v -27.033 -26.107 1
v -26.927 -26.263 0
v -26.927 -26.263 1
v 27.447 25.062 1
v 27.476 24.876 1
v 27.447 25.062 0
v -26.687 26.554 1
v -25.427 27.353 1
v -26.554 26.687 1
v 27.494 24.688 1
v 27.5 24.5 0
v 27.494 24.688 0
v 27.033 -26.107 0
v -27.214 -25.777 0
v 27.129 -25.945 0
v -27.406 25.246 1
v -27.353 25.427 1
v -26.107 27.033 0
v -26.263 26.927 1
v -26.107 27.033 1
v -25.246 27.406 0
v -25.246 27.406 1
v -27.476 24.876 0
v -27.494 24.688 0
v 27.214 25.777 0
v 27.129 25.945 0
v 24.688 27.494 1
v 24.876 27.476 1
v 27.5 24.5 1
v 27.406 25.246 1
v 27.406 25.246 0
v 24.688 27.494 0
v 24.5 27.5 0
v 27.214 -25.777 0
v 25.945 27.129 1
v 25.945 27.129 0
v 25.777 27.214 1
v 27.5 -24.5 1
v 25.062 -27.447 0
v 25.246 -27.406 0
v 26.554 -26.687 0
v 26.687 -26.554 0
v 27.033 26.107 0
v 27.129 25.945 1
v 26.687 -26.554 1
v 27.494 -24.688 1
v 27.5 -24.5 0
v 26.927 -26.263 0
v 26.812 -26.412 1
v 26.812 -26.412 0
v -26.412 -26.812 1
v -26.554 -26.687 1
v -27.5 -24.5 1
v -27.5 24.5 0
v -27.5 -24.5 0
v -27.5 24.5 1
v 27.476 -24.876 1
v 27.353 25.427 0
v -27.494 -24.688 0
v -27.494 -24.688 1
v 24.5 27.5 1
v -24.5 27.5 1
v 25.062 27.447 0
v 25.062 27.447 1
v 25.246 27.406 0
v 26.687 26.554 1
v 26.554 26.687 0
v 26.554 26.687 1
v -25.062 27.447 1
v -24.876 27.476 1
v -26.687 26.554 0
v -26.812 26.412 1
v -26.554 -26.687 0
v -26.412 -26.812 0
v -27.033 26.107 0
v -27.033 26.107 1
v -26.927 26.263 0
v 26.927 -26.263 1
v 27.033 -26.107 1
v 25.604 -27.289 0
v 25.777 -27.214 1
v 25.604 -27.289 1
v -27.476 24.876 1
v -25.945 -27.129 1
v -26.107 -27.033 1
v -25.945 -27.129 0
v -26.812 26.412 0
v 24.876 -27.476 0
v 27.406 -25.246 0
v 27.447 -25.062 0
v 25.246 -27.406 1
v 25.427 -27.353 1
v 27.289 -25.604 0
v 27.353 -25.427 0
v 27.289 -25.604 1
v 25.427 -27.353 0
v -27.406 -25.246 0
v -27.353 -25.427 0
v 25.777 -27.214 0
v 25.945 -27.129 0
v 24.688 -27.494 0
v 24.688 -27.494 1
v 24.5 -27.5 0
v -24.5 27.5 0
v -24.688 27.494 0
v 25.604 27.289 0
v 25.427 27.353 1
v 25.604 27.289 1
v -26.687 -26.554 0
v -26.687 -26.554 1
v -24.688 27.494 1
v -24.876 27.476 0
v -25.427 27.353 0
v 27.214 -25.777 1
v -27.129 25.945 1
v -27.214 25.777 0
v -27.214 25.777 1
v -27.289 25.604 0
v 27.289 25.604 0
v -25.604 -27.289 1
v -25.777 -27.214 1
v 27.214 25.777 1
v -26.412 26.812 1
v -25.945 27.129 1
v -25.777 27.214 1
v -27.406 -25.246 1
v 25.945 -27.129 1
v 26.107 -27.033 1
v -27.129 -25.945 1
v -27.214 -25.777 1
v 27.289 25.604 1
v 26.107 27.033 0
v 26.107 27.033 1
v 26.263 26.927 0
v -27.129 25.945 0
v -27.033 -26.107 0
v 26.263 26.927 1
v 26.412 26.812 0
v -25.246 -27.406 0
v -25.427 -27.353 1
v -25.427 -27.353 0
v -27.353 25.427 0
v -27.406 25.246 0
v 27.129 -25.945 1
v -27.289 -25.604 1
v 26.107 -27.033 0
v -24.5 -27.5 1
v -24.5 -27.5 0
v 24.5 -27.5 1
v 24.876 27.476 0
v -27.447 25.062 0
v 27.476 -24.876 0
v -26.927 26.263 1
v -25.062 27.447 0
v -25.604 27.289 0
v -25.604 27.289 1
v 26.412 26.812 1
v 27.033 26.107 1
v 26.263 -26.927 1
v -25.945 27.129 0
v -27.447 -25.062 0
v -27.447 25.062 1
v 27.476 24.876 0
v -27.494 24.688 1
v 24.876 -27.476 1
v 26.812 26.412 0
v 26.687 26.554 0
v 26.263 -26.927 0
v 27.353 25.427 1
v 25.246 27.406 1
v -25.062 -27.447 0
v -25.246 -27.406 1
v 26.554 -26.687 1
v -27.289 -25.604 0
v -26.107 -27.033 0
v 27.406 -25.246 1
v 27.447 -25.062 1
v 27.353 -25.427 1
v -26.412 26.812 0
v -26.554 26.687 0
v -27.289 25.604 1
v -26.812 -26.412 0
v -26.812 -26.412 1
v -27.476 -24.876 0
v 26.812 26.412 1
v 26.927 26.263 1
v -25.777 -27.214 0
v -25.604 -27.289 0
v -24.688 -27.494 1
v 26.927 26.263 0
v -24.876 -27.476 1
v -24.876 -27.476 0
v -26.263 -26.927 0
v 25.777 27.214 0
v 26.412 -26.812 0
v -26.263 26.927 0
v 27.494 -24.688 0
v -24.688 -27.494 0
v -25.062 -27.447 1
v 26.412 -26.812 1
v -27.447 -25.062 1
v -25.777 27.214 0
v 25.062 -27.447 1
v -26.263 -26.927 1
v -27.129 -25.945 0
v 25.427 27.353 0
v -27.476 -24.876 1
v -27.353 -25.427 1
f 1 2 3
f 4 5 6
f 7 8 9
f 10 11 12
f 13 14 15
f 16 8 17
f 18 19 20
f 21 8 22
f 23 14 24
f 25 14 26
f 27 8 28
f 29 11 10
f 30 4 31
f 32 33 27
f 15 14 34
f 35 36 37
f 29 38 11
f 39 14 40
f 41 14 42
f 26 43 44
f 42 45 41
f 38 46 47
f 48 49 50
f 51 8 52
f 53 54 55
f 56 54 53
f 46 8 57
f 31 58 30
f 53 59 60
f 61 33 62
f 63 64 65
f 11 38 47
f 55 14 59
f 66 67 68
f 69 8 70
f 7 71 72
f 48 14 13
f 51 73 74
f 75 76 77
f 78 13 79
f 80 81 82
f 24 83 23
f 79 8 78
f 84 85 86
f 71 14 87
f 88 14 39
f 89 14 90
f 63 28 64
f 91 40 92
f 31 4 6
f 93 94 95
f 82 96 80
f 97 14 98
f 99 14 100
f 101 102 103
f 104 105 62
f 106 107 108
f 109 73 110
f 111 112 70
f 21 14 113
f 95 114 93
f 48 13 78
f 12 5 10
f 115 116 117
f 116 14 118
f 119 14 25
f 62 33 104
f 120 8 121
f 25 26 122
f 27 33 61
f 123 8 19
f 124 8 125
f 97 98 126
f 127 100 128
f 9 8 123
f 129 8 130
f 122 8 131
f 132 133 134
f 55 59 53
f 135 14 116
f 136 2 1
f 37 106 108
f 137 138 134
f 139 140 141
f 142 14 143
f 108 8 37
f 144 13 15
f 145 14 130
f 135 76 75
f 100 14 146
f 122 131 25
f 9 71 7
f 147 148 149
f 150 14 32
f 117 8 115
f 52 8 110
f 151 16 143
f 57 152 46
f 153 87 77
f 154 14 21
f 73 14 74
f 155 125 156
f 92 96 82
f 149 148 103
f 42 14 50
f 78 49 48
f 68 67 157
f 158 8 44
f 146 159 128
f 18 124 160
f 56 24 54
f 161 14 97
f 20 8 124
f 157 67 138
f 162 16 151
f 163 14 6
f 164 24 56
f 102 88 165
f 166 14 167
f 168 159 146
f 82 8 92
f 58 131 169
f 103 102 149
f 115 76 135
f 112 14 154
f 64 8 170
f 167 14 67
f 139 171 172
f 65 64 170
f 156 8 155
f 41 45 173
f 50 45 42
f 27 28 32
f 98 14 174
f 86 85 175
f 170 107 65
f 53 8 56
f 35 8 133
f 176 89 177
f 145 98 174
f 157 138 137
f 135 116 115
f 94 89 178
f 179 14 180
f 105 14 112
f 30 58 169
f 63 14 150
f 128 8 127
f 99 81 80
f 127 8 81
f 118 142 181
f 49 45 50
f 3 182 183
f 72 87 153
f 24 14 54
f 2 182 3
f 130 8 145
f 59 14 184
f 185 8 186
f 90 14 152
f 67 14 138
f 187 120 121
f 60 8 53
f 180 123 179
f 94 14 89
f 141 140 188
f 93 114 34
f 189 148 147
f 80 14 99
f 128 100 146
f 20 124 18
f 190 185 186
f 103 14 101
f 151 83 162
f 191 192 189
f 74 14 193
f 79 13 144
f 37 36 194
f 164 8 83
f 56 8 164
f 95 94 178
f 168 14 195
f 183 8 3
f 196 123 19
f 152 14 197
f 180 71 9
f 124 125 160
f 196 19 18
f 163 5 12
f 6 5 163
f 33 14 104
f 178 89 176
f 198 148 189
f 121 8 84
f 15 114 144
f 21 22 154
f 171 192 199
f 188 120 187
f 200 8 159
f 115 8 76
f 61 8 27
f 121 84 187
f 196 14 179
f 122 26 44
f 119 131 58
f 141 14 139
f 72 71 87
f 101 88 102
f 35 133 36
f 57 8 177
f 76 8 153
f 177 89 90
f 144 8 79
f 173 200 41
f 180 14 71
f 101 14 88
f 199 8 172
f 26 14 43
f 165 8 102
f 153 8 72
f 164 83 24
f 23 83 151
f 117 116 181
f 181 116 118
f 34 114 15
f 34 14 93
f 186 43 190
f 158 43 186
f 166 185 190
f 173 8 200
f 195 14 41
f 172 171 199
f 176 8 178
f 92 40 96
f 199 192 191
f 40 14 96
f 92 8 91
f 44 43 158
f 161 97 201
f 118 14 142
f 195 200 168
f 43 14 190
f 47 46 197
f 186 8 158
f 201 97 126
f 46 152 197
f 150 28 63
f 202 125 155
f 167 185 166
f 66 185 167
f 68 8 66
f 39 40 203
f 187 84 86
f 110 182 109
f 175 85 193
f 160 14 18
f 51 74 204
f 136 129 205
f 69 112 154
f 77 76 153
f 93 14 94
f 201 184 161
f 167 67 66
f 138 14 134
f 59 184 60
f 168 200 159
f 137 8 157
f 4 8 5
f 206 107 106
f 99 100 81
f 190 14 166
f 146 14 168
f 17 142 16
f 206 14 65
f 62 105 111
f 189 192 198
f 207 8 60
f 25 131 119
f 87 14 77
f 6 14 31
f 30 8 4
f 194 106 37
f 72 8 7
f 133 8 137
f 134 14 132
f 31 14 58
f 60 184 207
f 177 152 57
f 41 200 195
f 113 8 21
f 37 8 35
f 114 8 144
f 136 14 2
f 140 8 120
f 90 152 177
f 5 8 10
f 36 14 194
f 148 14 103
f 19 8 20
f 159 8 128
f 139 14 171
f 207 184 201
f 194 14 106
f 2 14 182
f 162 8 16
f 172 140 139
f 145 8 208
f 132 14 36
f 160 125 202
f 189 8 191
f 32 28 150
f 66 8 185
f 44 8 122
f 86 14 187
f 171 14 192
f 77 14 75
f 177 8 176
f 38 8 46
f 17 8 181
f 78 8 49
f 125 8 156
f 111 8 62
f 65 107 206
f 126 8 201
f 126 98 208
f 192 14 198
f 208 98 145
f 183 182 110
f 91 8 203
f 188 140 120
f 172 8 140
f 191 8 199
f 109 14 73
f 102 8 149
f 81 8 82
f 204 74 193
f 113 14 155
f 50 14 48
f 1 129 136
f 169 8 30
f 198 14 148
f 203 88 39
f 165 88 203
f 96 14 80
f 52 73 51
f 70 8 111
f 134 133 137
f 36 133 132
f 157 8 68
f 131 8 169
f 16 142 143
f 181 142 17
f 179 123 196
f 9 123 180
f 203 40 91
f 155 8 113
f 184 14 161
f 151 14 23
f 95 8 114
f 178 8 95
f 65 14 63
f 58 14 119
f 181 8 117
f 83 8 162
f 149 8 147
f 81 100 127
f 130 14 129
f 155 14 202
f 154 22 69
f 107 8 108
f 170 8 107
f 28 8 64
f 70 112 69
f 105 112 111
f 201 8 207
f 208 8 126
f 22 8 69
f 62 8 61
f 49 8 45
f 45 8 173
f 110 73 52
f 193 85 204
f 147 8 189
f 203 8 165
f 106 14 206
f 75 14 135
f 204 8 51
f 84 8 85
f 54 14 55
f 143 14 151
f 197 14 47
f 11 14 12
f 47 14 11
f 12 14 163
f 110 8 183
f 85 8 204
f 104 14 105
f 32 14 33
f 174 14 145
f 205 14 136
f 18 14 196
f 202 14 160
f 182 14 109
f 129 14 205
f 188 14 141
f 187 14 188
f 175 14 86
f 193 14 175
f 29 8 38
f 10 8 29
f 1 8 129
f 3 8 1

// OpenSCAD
// ==========================================
// PARAMETER - Hier kannst du die Maße ändern
// ==========================================

breite = 55;      // Gesamte Breite der Platte (X-Achse) in mm
laenge = 55;      // Gesamte Länge der Platte (Y-Achse) in mm
hoehe = 1;        // Stärke/Dicke der Platte (Z-Achse) in mm
radius = 3;       // Radius der abgerundeten Ecken in mm

$fn = 100;        // Auflösung der Rundungen (höherer Wert = glattere Kurven)

// ==========================================
// BERECHNUNG & GEOMETRIE
// ==========================================

// Wir verschieben die Zylinder so, dass die Außenkanten 
// exakt den oben definierten Maßen entsprechen.
versatz_x = (breite / 2) - radius;
versatz_y = (laenge / 2) - radius;

// Der hull-Befehl "umspannt" die vier Zylinder wie ein straffes Band
hull() {
    // Ecke hinten rechts
    translate([versatz_x, versatz_y, 0])
        cylinder(h = hoehe, r = radius, center = false);
        
    // Ecke hinten links
    translate([-versatz_x, versatz_y, 0])
        cylinder(h = hoehe, r = radius, center = false);
        
    // Ecke vorne rechts
    translate([versatz_x, -versatz_y, 0])
        cylinder(h = hoehe, r = radius, center = false);
        
    // Ecke vorne links
    translate([-versatz_x, -versatz_y, 0])
        cylinder(h = hoehe, r = radius, center = false);
}
